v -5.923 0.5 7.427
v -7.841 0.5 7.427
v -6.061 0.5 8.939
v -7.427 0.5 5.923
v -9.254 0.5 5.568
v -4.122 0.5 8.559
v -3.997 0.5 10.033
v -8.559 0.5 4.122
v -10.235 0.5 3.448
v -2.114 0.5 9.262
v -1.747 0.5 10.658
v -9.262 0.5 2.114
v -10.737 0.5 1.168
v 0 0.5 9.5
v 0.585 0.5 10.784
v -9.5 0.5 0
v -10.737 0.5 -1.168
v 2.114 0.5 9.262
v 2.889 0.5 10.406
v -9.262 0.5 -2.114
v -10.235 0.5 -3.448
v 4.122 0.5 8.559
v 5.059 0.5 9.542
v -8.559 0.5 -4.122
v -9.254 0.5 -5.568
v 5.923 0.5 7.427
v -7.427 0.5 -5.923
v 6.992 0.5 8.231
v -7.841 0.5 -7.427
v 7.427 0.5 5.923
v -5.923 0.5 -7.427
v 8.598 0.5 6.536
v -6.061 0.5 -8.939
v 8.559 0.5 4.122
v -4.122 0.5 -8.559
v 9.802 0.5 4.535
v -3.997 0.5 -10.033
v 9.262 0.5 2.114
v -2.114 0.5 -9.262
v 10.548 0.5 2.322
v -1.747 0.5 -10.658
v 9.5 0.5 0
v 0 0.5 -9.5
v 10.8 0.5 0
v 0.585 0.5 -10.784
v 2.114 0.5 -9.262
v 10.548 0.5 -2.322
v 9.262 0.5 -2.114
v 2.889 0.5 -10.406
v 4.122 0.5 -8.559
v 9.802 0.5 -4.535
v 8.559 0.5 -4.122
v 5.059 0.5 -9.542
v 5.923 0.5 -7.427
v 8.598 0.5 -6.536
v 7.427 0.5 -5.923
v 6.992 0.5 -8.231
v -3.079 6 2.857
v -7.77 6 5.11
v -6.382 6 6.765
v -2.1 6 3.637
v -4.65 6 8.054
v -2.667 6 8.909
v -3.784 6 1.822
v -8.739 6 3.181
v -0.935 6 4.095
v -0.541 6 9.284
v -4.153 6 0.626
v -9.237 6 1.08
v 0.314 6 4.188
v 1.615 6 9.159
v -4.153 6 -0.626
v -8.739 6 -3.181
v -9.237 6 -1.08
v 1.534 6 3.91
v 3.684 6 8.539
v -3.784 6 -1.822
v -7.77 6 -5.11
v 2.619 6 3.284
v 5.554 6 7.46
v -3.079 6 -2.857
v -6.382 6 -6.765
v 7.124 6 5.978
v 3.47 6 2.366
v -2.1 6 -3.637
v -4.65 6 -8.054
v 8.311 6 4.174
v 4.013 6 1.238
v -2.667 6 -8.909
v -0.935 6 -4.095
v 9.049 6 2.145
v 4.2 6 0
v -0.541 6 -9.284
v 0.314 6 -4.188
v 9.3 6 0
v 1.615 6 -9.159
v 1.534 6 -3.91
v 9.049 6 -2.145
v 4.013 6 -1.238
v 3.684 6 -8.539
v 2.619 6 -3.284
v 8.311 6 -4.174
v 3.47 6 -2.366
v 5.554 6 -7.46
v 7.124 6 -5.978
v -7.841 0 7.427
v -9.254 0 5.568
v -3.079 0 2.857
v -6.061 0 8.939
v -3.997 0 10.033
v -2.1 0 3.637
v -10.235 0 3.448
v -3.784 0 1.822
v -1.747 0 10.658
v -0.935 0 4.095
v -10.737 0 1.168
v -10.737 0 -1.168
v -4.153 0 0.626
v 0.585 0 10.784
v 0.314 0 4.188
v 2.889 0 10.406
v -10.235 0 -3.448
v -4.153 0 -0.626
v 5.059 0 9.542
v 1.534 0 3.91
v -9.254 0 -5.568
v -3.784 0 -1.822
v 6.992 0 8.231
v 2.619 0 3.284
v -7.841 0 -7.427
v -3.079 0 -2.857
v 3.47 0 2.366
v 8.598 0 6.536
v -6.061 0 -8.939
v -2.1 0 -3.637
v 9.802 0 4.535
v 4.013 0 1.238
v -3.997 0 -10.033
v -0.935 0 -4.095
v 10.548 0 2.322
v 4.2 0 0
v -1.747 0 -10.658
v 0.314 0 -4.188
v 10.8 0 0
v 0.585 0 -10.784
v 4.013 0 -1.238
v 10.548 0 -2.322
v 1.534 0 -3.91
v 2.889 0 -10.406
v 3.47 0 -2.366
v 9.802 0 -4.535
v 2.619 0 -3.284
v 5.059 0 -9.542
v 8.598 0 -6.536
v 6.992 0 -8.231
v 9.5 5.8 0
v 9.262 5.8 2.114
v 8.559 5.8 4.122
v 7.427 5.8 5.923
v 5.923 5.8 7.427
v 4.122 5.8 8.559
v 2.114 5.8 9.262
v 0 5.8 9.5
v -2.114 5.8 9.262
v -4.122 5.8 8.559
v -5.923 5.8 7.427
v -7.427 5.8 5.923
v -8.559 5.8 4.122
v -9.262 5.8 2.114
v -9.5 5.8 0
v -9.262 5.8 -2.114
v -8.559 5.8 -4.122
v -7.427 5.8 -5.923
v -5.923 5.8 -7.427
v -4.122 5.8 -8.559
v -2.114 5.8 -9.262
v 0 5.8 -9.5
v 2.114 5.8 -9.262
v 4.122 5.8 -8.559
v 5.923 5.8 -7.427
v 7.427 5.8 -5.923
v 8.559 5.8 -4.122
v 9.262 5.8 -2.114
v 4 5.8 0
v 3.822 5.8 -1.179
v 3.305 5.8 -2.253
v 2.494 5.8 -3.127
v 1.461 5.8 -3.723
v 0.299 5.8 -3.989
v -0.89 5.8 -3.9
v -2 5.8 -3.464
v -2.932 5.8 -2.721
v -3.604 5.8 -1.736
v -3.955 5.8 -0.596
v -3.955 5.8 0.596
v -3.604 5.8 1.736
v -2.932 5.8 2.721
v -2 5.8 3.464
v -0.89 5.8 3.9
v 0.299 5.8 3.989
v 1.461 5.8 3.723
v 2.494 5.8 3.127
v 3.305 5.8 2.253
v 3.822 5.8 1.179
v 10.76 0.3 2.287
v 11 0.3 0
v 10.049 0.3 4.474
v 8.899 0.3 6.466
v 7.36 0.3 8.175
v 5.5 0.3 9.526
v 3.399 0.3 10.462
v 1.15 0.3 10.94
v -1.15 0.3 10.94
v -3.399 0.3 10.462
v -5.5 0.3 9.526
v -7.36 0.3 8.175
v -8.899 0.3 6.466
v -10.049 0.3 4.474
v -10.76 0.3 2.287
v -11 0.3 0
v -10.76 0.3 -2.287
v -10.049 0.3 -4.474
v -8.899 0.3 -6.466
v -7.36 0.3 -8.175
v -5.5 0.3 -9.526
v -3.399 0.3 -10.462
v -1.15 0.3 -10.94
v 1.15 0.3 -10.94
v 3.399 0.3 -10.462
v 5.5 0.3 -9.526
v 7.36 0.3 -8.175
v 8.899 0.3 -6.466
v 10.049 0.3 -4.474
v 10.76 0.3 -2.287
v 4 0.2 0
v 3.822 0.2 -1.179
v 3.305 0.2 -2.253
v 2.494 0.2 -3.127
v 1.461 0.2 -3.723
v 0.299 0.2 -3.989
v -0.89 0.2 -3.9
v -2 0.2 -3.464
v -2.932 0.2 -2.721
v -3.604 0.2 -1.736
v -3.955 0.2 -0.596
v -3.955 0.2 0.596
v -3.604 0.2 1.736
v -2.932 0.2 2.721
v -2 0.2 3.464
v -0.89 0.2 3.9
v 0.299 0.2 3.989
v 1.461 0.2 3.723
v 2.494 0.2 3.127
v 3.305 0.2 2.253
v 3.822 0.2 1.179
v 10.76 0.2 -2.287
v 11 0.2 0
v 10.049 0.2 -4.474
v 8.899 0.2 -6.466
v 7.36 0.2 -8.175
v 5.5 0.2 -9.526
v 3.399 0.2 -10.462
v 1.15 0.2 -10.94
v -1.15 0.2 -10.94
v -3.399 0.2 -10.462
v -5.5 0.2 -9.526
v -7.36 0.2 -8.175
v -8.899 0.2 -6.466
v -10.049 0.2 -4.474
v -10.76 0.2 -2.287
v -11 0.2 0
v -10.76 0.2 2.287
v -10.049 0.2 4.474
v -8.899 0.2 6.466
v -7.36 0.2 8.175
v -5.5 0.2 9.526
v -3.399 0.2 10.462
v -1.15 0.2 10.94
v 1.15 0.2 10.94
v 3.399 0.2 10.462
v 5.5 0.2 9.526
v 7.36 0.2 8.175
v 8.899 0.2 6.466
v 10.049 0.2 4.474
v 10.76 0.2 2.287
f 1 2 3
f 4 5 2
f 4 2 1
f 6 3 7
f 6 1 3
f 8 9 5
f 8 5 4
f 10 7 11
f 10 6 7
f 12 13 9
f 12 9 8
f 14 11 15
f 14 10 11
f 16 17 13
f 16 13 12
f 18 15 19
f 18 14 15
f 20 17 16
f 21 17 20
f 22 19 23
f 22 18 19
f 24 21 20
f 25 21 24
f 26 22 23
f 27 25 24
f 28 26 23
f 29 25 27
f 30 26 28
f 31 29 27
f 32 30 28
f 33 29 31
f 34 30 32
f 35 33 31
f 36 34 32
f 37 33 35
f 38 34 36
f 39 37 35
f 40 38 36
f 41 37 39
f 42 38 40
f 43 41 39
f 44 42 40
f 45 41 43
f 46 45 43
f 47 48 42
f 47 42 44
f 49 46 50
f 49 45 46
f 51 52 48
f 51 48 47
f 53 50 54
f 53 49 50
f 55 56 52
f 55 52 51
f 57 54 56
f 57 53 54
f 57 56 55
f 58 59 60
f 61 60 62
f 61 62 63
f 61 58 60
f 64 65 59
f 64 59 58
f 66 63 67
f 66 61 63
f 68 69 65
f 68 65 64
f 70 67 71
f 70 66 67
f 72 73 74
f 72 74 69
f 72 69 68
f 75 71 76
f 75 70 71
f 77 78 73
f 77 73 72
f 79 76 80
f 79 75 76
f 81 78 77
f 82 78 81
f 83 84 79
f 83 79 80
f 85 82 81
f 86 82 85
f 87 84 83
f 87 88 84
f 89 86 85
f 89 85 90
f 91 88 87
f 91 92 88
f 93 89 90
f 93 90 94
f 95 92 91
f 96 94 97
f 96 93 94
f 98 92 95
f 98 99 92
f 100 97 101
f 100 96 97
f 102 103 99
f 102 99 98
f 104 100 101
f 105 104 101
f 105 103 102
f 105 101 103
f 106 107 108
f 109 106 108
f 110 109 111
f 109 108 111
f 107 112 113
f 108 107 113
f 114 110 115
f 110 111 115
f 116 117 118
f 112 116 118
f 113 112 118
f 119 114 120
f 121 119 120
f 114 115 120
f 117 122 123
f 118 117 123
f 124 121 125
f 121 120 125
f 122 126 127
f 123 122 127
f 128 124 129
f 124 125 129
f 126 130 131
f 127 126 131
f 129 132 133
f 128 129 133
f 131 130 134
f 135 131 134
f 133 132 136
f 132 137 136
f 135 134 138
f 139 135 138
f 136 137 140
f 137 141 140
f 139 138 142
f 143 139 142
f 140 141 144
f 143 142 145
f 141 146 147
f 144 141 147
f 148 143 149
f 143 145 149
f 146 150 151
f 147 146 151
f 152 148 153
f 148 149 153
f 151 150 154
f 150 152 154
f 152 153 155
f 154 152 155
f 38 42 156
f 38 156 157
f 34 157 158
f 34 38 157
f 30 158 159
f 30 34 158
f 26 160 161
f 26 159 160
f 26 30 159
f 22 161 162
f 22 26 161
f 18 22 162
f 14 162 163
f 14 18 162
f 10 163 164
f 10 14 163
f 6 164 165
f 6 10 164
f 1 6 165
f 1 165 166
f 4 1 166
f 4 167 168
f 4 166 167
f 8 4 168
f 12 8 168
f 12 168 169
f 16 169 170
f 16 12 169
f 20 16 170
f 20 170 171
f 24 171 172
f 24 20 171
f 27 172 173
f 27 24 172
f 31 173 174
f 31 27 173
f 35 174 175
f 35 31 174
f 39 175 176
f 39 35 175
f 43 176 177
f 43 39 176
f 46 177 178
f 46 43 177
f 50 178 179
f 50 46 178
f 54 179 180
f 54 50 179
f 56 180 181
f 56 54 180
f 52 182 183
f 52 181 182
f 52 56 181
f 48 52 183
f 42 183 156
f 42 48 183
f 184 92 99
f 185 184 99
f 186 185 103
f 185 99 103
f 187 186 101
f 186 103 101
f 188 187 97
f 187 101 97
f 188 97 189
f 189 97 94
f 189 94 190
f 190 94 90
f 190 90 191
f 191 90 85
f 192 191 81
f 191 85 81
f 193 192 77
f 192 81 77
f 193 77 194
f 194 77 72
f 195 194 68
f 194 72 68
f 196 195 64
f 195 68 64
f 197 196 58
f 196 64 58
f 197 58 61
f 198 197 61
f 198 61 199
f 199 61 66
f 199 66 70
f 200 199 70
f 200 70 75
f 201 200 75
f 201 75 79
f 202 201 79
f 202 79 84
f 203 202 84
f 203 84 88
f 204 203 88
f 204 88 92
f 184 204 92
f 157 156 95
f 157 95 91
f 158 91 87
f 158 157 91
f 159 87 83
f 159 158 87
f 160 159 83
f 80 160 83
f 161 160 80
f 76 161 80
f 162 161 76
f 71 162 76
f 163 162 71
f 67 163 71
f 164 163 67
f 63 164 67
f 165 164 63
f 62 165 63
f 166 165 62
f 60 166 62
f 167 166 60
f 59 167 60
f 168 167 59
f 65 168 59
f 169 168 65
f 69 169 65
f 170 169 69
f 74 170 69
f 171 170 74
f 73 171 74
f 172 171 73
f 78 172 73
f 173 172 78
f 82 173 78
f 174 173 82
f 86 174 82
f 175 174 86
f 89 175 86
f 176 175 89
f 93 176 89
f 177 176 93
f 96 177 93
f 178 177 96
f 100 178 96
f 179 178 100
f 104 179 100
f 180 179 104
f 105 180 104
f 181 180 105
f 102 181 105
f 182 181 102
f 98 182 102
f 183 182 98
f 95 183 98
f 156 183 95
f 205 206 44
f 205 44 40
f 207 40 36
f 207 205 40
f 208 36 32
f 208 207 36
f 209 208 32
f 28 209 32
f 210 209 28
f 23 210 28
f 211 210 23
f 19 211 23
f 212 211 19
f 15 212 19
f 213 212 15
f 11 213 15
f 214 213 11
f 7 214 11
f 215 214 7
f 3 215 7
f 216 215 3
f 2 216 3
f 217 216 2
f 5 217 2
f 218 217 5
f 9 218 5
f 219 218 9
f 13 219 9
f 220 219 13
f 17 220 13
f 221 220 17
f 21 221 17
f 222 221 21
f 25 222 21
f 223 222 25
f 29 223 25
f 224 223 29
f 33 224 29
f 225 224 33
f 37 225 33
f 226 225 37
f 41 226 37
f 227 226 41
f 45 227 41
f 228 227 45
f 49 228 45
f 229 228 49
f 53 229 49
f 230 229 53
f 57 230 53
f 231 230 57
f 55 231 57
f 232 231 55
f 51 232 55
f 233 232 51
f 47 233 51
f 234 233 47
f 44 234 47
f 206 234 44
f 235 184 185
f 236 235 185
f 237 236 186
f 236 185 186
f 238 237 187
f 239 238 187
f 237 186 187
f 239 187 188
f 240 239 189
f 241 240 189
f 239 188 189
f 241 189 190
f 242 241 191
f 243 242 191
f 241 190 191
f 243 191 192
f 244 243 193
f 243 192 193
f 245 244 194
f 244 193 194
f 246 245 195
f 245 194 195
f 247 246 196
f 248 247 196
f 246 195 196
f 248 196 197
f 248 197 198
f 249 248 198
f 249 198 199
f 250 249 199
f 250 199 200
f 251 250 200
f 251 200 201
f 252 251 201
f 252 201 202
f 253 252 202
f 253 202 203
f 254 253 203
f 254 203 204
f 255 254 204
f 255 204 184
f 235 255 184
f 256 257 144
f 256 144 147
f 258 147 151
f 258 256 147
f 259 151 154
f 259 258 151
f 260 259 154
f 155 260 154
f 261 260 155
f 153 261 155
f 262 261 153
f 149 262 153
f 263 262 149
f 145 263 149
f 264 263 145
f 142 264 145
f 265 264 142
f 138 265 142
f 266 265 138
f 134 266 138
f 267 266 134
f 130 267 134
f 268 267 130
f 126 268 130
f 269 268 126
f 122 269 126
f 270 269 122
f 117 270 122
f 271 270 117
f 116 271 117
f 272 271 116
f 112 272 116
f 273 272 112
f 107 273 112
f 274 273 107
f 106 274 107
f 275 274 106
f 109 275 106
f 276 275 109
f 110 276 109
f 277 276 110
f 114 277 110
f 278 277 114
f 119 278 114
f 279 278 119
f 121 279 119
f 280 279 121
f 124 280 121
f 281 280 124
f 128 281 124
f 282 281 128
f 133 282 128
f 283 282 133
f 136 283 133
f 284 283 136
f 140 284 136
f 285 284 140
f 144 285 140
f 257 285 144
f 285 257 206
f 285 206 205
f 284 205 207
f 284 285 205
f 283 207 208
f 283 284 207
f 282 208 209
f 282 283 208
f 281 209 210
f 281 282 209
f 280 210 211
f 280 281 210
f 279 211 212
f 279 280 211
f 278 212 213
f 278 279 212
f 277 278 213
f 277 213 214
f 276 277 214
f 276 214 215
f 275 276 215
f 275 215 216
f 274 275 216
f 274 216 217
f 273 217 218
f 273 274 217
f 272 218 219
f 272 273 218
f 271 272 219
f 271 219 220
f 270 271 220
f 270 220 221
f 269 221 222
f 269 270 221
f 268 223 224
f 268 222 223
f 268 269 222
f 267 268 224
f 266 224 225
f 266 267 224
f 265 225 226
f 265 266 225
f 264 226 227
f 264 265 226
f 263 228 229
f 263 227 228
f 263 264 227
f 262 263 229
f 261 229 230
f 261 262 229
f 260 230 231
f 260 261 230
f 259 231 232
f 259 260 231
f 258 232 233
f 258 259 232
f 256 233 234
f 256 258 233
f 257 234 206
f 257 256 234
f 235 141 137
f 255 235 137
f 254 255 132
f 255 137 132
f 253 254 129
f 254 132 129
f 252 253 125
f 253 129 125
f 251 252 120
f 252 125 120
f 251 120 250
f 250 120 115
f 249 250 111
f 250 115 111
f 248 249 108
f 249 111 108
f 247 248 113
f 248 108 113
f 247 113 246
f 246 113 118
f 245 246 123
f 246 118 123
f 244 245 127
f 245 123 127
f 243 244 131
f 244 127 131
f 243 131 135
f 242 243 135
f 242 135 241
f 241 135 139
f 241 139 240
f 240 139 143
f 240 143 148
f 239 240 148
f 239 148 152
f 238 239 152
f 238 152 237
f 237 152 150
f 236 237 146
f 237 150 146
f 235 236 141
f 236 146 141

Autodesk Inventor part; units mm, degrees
ref_plane "YZ Plane" through (0, 0, 0) normal (1, 0, 0) x (0, 1, 0)
ref_plane "XZ Plane" through (0, 0, 0) normal (0, 1, 0) x (-1, 0, 0)
ref_plane "XY Plane" through (0, 0, 0) normal (0, 0, 1) x (1, 0, 0)
sketch "スケッチ1" plane through (0, 0, 0) normal (0, 0, 1) x (1, 0, 0)
  line L0 (4, 0) -> (4, 6)
  line L1 (4, 6) -> (9.5, 6)
  line L2 (9.5, 6) -> (9.5, 0.5)
  line L3 (9.5, 0.5) -> (11, 0.5)
  line L4 (11, 0.5) -> (11, 0)
  line L5 (11, 0) -> (4, 0)
  line L6 (0, 0) -> (0, 6.1022) construction
  dimension "d0" = 4
  dimension "d1" = 6
  dimension "d2" = 0.5
  dimension "d3" = 9.5
  dimension "d4" = 11
revolve "回転1" add sketch "スケッチ1" angle 360 about axis through (0, 0, 0) along (0, 1, 0)
chamfer "面取り1" distance 0.2 angle 45 5 edges at (-4, 6, 0) (-9.5, 6, 0) (-11, 0.5, 0) (-11, 0, 0) (-4, 0, 0)
properties part number "ベアリングフランジ付き"
